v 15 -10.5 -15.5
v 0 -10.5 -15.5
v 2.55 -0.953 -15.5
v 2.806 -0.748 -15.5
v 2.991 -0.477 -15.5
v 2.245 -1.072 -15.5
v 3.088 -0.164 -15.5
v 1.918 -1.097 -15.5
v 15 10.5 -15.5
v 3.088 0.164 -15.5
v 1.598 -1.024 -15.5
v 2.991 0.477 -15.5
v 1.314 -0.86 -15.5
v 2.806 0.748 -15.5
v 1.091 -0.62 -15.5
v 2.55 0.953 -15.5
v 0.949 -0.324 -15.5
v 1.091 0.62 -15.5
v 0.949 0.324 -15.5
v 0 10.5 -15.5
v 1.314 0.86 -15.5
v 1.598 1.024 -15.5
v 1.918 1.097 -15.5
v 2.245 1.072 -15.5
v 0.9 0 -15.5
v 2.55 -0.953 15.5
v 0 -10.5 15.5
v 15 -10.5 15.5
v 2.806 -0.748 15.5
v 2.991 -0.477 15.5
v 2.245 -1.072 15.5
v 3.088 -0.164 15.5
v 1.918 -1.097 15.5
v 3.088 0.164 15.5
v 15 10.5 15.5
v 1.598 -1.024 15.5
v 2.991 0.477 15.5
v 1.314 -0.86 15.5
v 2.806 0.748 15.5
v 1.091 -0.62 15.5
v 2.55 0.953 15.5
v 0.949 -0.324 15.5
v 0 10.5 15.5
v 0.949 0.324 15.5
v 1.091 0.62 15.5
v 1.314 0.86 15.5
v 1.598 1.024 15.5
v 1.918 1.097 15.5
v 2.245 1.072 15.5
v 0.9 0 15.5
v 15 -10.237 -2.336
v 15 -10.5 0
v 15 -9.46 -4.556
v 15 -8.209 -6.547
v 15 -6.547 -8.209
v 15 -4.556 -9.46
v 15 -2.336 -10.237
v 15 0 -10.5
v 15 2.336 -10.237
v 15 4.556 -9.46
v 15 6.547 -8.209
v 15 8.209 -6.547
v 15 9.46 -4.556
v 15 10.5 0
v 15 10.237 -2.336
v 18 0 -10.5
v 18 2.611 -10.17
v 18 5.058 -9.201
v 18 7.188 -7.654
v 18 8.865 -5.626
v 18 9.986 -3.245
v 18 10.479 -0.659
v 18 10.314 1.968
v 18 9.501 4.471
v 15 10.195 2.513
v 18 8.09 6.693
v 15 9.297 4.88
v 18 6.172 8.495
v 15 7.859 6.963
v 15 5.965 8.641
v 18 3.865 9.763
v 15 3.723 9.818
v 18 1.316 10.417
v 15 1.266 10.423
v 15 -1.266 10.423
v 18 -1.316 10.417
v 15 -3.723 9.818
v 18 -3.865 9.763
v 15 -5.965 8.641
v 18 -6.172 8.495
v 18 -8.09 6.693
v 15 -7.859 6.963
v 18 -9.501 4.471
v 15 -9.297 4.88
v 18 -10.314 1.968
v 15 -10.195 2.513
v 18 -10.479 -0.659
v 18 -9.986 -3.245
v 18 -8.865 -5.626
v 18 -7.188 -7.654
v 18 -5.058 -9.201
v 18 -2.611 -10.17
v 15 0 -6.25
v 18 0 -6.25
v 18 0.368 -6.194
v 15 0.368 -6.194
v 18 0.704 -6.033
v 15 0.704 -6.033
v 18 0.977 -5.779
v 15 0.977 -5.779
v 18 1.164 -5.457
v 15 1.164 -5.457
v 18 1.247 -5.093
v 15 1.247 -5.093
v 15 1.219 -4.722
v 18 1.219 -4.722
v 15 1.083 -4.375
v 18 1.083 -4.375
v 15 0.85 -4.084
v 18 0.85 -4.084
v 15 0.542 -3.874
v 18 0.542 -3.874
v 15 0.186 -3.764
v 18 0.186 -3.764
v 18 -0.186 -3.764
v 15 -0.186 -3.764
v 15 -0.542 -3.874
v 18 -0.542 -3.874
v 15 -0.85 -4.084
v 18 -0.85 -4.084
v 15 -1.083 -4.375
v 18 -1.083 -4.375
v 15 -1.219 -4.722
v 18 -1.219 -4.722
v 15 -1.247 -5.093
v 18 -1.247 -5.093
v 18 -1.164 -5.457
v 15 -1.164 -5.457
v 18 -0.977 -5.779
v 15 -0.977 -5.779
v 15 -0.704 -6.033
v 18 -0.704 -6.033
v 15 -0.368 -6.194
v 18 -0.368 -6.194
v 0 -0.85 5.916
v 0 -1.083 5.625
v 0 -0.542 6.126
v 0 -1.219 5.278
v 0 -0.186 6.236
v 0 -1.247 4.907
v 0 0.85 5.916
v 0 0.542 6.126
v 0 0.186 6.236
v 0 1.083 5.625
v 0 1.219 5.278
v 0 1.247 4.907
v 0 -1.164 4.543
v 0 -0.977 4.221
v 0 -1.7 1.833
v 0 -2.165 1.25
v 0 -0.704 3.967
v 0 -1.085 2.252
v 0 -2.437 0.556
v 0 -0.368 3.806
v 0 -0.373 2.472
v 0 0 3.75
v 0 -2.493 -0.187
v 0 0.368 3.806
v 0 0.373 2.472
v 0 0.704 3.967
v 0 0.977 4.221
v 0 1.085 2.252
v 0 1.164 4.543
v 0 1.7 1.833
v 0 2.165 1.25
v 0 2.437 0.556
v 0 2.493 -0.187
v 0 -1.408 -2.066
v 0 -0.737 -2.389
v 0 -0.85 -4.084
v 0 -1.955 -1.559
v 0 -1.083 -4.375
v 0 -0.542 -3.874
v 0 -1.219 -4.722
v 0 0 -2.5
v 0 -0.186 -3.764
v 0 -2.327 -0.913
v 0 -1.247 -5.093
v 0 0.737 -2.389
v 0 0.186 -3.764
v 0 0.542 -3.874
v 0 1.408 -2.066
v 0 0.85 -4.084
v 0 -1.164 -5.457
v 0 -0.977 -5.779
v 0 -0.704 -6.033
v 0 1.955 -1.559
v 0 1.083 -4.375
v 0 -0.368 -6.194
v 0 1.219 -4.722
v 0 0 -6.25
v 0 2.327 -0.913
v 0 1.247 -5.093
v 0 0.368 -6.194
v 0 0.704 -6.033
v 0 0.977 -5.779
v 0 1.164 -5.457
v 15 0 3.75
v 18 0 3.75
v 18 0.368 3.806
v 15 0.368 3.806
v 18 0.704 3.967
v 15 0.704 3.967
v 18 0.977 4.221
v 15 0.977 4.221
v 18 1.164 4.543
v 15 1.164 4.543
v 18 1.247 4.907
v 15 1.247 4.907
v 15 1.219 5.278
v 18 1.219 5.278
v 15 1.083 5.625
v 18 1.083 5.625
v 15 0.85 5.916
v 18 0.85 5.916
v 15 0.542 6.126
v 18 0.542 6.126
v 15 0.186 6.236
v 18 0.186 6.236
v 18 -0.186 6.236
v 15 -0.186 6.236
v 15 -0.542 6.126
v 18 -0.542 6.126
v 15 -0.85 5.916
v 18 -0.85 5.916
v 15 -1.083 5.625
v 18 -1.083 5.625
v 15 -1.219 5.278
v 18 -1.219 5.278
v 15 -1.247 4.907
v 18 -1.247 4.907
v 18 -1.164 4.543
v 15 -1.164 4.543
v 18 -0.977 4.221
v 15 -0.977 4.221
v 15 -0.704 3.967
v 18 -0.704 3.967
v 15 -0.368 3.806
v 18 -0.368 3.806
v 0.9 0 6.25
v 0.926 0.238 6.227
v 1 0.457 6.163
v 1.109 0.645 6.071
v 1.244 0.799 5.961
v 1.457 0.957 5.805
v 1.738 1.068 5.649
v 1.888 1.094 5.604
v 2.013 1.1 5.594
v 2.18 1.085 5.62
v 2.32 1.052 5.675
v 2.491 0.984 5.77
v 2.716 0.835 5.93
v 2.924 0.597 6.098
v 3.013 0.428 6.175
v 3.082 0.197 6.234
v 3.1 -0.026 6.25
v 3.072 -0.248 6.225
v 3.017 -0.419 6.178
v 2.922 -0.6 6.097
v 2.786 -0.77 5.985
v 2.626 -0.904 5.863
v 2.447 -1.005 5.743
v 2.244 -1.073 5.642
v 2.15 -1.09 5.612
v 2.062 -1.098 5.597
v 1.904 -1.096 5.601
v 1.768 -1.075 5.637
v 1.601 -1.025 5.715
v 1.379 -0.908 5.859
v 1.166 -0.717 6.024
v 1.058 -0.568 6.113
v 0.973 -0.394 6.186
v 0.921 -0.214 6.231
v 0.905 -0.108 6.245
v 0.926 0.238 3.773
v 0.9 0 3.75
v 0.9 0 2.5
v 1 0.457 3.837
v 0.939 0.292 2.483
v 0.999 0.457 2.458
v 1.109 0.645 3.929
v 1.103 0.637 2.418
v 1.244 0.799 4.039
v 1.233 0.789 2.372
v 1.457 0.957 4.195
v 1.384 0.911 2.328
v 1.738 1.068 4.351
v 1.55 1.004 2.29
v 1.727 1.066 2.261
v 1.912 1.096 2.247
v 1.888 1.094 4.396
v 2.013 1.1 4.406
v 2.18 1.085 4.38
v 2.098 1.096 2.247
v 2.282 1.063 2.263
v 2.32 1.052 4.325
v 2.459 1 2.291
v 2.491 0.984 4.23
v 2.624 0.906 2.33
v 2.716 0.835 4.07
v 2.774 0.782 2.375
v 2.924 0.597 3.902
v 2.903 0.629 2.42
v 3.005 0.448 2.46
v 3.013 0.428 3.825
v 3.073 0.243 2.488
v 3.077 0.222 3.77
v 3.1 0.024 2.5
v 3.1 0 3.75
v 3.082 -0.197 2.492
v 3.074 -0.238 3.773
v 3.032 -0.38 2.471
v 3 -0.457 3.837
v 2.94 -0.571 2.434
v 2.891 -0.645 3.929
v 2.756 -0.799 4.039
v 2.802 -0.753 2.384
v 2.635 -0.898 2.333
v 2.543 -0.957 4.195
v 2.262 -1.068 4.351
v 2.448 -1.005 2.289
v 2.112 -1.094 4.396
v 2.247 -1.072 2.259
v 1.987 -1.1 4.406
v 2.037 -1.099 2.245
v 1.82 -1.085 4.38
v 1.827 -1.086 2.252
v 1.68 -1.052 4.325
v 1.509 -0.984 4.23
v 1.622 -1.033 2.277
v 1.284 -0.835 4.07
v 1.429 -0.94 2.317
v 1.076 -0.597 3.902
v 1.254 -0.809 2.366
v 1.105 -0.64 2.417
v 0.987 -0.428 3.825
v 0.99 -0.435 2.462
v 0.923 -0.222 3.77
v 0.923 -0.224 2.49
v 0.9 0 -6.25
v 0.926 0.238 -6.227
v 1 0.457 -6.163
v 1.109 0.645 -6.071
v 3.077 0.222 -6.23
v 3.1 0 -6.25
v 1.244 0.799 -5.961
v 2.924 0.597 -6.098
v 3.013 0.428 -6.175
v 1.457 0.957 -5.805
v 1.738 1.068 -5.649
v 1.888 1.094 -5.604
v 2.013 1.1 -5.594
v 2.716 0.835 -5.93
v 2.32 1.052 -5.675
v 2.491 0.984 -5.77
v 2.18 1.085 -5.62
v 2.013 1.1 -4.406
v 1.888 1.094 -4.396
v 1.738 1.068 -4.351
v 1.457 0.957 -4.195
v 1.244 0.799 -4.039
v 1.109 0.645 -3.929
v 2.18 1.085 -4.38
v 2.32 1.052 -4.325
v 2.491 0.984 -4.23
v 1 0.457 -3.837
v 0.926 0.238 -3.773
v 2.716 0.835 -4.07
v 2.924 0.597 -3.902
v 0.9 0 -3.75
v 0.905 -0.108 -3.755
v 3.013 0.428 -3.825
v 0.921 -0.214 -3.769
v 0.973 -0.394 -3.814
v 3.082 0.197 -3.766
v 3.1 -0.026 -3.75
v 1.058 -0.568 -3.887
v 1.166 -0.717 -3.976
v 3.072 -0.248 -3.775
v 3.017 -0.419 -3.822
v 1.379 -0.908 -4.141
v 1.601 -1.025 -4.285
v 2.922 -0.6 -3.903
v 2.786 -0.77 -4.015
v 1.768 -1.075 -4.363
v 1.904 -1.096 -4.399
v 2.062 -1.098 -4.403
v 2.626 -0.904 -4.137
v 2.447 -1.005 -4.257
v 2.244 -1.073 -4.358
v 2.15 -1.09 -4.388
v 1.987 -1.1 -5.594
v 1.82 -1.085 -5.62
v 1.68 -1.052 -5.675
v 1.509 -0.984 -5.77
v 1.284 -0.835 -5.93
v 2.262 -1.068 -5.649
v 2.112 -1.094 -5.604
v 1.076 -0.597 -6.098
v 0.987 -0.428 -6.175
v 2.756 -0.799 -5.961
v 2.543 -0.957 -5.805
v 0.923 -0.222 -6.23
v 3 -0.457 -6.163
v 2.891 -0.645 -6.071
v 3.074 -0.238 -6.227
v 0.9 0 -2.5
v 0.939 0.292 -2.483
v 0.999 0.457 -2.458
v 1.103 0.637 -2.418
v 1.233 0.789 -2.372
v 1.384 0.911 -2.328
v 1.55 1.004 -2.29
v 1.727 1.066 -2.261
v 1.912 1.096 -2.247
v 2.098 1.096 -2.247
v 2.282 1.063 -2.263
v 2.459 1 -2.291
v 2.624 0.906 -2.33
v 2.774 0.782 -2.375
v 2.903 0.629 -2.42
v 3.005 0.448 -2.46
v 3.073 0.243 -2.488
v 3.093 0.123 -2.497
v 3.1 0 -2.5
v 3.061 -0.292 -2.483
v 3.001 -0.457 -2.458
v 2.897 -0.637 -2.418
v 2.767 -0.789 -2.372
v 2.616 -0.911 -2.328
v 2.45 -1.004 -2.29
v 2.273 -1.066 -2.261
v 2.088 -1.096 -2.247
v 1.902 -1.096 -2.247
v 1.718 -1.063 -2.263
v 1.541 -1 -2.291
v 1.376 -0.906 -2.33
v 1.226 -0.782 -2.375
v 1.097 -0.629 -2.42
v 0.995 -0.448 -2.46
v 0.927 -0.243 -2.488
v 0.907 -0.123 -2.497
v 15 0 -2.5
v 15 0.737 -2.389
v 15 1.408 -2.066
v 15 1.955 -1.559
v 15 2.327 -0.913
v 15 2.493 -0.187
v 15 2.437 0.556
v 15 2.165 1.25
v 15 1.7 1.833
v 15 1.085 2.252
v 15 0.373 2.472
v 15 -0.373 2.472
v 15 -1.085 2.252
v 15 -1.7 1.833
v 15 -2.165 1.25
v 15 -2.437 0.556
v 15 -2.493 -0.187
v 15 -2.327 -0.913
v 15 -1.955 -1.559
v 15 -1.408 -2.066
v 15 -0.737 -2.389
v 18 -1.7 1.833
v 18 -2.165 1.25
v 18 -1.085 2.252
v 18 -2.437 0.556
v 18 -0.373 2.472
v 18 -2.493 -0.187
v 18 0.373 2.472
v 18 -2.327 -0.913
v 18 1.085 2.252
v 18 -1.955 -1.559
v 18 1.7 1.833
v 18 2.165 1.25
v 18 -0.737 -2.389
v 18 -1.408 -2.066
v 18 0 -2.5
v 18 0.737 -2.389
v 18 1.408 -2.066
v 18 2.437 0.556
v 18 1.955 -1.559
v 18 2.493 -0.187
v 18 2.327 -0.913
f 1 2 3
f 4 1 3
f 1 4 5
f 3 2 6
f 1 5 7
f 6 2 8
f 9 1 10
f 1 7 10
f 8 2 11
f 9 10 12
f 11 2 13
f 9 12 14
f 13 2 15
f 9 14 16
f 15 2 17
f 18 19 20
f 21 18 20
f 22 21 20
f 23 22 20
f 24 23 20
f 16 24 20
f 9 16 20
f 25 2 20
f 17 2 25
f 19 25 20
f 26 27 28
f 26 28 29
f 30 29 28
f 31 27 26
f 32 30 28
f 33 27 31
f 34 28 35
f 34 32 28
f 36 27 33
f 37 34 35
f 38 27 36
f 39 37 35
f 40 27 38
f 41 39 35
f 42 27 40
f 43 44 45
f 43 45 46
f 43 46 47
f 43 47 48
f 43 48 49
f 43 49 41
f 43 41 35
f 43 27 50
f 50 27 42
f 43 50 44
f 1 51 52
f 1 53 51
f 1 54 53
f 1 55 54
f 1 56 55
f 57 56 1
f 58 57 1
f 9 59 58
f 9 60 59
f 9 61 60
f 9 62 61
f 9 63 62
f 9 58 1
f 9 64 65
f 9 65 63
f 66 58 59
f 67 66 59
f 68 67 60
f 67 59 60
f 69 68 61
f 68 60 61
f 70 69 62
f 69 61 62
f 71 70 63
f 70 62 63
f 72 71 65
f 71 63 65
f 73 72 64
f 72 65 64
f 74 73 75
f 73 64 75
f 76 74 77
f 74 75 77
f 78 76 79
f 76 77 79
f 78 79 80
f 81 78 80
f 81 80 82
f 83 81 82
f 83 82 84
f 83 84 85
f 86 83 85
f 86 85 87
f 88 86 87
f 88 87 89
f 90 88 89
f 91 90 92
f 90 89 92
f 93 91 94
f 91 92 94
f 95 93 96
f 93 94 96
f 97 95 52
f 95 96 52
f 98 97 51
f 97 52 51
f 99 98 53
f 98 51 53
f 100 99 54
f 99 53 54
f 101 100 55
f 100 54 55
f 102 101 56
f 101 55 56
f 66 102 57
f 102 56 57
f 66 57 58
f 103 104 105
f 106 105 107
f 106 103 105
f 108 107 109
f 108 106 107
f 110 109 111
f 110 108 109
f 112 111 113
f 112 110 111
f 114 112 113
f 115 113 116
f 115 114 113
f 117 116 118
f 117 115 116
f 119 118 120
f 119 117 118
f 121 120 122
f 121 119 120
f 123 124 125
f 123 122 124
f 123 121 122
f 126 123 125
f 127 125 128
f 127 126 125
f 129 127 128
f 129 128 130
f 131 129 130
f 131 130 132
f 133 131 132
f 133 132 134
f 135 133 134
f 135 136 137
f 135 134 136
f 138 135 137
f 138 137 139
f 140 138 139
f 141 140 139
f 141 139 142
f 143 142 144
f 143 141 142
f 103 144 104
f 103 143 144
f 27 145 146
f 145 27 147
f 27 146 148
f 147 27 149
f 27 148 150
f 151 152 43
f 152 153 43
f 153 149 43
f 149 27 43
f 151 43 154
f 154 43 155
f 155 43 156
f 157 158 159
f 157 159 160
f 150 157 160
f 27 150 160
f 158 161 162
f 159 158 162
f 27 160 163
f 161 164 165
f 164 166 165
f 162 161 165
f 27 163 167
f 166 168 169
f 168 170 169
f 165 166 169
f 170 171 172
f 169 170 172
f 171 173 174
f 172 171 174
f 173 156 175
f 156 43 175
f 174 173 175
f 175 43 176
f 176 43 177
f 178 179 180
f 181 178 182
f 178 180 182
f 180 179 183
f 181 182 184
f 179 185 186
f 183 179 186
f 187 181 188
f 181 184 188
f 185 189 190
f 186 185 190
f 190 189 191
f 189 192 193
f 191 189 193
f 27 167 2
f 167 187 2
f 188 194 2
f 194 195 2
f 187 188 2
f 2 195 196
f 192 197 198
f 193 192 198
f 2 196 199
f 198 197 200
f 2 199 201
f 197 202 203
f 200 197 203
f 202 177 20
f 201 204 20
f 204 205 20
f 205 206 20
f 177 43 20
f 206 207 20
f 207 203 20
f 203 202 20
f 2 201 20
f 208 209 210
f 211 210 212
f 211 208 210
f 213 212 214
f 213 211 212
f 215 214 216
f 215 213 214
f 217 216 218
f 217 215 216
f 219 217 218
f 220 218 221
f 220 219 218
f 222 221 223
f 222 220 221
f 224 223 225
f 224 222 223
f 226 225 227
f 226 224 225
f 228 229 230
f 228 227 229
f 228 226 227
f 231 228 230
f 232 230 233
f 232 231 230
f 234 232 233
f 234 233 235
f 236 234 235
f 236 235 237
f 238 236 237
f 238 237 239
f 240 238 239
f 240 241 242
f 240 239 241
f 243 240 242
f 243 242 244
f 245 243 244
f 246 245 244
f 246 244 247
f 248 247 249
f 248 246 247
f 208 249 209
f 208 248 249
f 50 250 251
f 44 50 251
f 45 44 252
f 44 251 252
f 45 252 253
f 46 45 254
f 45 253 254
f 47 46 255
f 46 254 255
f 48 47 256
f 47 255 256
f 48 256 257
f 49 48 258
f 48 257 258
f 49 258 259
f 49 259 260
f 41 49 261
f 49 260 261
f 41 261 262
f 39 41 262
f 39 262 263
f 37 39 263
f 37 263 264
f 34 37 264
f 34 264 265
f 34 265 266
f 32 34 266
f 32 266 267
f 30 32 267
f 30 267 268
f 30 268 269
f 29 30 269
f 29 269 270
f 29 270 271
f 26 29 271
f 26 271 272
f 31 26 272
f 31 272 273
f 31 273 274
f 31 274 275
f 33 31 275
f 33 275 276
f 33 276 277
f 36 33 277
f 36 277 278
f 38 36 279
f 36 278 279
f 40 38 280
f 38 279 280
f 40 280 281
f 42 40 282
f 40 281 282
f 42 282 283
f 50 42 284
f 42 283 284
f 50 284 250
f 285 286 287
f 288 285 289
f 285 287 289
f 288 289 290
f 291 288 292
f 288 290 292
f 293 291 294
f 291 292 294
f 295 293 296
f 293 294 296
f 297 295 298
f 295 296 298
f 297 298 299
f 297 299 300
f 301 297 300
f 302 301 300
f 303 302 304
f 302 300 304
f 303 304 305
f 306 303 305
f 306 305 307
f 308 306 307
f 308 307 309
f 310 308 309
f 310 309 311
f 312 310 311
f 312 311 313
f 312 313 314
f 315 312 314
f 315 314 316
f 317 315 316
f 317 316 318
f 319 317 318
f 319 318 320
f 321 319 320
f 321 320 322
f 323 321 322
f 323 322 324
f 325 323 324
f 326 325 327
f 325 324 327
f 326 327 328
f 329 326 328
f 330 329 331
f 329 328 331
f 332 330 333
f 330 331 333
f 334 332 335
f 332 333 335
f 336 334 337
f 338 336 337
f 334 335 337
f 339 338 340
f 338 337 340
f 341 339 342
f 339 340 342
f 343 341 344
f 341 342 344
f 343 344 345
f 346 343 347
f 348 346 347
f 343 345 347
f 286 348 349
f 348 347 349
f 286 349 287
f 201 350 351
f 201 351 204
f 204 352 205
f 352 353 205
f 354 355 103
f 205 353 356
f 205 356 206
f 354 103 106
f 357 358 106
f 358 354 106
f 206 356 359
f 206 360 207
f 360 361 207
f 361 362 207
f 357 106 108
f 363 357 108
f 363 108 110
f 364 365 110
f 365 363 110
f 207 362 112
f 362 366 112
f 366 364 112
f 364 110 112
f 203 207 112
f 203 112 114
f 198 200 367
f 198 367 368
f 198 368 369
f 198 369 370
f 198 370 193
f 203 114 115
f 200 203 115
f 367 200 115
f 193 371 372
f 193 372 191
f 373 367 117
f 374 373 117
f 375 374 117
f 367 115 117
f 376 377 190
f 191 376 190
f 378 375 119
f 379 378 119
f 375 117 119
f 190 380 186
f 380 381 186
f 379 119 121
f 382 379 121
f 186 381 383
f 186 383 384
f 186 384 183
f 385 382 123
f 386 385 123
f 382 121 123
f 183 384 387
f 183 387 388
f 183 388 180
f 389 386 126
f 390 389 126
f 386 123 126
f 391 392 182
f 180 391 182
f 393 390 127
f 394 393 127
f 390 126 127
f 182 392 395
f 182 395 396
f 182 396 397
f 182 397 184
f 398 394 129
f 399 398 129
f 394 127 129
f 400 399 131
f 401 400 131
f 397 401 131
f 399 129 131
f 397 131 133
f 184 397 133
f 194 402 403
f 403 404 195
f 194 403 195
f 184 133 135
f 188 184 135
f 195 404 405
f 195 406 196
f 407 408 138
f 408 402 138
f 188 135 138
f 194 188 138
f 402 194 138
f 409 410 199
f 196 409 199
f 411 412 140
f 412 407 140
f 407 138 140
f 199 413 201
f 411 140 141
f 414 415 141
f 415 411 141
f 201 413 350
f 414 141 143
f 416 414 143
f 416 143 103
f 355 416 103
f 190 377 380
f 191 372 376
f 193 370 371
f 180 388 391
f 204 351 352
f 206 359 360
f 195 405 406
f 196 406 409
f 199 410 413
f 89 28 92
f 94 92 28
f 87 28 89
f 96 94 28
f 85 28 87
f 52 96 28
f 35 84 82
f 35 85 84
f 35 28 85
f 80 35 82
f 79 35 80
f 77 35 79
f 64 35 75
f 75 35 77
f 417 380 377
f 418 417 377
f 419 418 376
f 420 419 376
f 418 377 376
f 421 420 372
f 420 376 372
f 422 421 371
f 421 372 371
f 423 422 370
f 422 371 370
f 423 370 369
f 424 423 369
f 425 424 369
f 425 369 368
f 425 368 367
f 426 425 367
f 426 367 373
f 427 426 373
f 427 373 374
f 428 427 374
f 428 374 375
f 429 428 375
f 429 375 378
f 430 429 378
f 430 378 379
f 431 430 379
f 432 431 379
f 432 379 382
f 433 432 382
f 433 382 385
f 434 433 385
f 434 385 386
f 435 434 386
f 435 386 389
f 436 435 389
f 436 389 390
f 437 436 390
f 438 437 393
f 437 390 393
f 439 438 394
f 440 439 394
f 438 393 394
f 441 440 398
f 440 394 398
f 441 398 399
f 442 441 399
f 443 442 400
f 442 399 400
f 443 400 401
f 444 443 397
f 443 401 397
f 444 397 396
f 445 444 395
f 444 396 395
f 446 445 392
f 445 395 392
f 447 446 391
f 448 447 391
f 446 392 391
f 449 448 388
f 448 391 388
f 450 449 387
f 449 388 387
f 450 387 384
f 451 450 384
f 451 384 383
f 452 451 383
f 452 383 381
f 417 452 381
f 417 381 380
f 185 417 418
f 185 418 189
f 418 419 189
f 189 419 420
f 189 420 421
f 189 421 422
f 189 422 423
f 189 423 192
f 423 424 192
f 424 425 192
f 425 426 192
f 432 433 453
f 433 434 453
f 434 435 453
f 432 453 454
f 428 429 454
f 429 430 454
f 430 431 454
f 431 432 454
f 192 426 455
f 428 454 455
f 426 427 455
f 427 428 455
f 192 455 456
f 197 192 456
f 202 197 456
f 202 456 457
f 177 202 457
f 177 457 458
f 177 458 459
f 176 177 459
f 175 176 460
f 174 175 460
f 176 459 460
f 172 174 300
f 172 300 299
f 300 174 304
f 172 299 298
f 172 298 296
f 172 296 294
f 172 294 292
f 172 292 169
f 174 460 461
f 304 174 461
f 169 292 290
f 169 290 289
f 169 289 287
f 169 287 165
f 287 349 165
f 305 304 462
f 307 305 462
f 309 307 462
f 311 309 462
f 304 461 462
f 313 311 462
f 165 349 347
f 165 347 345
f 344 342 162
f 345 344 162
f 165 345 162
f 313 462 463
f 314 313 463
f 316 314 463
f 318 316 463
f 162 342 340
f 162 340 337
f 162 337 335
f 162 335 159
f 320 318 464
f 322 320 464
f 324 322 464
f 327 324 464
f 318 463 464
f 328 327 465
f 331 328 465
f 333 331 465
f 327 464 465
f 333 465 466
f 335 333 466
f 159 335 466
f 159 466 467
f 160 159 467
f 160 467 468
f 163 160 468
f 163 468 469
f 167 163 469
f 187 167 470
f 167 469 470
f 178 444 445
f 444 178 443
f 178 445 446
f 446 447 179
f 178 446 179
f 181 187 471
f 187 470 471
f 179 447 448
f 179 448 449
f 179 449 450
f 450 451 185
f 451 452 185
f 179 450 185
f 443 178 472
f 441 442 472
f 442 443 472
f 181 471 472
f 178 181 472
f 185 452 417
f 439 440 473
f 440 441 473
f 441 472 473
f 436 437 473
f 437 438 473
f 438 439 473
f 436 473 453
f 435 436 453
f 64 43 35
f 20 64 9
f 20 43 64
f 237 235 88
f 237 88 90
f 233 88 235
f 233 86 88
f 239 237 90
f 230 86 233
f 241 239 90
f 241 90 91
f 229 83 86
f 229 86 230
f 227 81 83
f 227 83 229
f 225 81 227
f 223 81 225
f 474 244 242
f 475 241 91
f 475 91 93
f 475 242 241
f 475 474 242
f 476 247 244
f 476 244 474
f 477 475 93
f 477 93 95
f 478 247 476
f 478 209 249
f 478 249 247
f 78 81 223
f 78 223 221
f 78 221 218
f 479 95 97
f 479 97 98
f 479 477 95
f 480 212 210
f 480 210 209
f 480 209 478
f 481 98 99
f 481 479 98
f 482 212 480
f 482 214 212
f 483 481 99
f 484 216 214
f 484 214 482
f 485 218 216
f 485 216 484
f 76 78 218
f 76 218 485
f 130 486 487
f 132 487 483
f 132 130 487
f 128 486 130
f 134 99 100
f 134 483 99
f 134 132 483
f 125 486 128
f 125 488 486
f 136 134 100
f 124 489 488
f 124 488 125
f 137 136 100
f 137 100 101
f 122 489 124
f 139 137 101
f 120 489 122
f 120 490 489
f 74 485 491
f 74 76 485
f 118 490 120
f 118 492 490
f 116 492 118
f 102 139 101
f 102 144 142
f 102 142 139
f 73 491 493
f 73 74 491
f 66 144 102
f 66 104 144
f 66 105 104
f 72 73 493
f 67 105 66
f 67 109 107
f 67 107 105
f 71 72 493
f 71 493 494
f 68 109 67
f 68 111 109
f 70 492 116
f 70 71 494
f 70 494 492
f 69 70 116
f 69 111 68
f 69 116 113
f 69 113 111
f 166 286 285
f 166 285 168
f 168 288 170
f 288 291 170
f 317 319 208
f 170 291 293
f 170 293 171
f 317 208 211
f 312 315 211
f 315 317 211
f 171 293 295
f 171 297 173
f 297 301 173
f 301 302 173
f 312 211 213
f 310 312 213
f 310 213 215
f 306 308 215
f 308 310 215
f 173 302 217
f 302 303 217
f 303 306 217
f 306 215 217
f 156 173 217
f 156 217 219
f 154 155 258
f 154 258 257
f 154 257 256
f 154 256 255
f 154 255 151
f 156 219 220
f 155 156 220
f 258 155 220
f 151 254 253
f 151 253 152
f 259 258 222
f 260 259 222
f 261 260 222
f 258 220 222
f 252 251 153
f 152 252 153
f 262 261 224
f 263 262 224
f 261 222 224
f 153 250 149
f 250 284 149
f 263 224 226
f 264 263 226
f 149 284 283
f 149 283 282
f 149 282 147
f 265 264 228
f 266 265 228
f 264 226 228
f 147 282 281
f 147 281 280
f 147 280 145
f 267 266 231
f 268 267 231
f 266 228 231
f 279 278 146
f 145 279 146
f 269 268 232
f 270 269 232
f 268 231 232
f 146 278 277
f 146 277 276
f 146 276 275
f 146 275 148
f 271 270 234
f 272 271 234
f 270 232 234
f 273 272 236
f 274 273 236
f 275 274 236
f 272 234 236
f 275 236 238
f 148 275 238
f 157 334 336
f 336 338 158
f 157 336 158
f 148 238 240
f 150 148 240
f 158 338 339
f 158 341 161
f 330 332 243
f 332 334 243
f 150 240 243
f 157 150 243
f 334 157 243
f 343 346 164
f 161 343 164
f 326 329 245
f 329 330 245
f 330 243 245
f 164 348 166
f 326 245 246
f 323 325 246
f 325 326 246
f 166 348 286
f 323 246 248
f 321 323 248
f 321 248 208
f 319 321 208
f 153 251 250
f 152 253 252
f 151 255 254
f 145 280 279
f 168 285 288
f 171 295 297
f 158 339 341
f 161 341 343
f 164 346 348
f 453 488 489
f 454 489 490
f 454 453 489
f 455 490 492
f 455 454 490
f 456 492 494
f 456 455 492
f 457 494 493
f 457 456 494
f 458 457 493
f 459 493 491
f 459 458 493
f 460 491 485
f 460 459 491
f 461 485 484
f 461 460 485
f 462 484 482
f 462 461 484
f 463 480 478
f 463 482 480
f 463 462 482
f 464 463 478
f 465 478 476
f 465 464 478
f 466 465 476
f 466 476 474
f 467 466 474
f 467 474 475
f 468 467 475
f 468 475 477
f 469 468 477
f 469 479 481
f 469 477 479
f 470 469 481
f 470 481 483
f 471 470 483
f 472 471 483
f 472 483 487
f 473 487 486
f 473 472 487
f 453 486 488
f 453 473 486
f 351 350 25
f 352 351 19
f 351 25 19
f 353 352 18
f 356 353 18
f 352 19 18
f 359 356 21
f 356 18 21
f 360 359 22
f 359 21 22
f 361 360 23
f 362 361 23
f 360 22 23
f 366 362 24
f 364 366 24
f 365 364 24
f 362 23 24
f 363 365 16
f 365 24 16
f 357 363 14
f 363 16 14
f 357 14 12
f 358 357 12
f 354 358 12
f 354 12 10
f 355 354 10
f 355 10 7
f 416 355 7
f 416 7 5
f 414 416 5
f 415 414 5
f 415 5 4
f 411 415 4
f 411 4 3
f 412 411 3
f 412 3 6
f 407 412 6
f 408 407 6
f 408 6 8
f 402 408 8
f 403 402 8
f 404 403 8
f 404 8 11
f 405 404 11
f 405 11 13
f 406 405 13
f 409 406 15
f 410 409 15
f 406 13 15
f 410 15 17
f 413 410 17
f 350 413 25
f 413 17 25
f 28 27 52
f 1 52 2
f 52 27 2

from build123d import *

# Parameters (mm, degrees)
SKETCH1_W               = 31
SKETCH1_H               = 21
BOSS_EXTRUDE1_DEPTH     = 15
M2_CLEARANCE_HOLE1_D    = 2.2
SKETCH10_R              = 10.5
BOSS_EXTRUDE3_DEPTH     = 3
SKETCH7_R               = 1.25
SKETCH7_R_2             = 2.5
CUT_EXTRUDE1_DEPTH      = 4
CUT_EXTRUDE1_DEPTH_BACK = 16


with BuildPart() as part:
    # Sketch1 → Boss-Extrude1 (new body)
    with BuildSketch(Plane(origin=(0, 0, 0), x_dir=(0, 0, -1), z_dir=(1, 0, 0))):
        Rectangle(SKETCH1_W, SKETCH1_H)
    extrude(amount=BOSS_EXTRUDE1_DEPTH)

    # M2 Clearance Hole1 (through all)
    with Locations(Plane.XY.offset(15.5)):
        with Locations((2, 0)):
            Hole(M2_CLEARANCE_HOLE1_D / 2)

    # Sketch10 → Boss-Extrude3 (add)
    with BuildSketch(Plane(origin=(15, 0, 0), x_dir=(0, 0, -1), z_dir=(1, 0, 0))):
        Circle(SKETCH10_R)
    extrude(amount=BOSS_EXTRUDE3_DEPTH)

    # Sketch7 → Cut-Extrude1 (cut, two sides)
    with BuildSketch(Plane(origin=(15, 0, 0), x_dir=(0, 0, -1), z_dir=(1, 0, 0))) as cut_extrude1_sk:
        with Locations((-5, 0)):
            Circle(SKETCH7_R)
        with Locations((5, 0)):
            Circle(SKETCH7_R)
        Circle(SKETCH7_R_2)
    extrude(amount=CUT_EXTRUDE1_DEPTH, mode=Mode.SUBTRACT)
    extrude(cut_extrude1_sk.sketch, amount=-CUT_EXTRUDE1_DEPTH_BACK, mode=Mode.SUBTRACT)


solid = part.part
